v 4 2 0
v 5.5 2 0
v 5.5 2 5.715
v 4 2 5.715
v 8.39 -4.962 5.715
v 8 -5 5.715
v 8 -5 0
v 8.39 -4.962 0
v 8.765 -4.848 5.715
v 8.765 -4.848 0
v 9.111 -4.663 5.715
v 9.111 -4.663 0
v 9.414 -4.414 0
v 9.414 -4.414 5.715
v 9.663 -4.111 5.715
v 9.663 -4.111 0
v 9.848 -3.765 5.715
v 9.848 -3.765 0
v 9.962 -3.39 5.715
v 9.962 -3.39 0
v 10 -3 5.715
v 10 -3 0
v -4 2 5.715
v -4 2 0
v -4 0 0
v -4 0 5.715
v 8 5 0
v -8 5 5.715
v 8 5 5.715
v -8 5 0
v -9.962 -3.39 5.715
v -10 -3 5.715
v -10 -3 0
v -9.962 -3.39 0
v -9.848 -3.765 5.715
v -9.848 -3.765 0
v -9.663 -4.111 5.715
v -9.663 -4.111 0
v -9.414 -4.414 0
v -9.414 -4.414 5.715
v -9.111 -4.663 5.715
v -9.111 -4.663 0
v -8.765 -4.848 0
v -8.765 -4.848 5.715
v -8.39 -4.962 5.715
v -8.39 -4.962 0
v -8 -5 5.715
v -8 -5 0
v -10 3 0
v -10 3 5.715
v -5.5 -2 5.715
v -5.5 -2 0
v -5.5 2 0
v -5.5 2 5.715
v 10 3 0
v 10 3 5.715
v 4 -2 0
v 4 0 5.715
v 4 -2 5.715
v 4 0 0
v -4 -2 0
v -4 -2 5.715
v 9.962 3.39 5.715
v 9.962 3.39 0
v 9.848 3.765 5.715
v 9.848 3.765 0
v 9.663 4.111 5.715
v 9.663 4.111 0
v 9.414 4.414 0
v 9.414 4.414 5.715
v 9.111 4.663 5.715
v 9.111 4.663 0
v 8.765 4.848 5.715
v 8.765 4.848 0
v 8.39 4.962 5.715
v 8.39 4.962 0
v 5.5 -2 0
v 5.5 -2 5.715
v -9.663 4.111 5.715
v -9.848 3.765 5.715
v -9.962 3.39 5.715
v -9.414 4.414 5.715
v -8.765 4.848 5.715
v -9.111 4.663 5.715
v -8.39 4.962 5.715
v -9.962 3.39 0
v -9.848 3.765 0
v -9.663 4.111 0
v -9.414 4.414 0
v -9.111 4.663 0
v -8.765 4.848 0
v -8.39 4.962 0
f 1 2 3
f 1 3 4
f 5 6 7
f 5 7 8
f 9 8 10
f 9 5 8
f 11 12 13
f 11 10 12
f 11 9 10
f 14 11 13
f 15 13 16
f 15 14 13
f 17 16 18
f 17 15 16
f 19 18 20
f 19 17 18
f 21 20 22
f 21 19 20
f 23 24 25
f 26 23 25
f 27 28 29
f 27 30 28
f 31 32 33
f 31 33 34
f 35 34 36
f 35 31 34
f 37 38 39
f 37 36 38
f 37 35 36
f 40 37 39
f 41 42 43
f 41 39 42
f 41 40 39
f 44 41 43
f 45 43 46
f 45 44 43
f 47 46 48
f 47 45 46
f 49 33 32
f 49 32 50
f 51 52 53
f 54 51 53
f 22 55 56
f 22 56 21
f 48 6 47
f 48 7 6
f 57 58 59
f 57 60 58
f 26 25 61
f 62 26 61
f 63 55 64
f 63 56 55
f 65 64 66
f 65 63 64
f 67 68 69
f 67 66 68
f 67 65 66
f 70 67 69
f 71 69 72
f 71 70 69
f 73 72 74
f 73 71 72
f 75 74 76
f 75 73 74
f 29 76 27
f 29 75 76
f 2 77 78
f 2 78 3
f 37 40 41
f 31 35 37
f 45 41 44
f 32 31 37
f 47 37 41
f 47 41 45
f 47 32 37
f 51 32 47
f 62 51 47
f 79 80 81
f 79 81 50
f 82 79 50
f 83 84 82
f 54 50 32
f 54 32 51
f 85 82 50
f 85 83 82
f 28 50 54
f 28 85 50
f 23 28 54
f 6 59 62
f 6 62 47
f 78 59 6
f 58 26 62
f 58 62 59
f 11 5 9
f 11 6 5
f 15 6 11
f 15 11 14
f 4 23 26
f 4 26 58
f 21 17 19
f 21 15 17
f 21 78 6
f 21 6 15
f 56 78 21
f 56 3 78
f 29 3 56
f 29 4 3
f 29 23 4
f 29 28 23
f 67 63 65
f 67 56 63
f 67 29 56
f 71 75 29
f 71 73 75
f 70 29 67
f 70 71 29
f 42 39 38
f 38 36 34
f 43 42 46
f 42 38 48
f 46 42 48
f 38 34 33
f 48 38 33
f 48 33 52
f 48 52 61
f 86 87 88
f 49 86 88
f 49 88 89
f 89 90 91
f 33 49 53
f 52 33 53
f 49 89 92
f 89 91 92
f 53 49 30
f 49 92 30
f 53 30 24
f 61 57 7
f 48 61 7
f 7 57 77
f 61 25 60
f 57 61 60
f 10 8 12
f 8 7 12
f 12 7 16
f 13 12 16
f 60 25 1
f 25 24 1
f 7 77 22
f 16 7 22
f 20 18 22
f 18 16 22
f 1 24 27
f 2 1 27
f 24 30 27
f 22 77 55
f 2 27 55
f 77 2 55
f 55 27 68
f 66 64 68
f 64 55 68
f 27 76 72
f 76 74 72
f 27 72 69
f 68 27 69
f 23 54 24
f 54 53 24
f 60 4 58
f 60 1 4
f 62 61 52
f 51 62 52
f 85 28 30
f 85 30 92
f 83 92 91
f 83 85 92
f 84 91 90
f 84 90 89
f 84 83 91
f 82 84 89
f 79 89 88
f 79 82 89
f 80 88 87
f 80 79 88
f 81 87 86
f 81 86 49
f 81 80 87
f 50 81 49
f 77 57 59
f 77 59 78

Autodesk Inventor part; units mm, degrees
ref_plane "YZ Plane" through (0, 0, 0) normal (1, 0, 0) x (0, 1, 0)
ref_plane "XZ Plane" through (0, 0, 0) normal (0, 1, 0) x (-1, 0, 0)
ref_plane "XY Plane" through (0, 0, 0) normal (0, 0, 1) x (1, 0, 0)
sketch "Sketch1" plane through (0, 0, 0) normal (0, 0, 1) x (1, 0, 0)
  line L0 (-10, 5) -> (10, 5)
  line L1 (10, 5) -> (10, -5)
  line L2 (10, -5) -> (-10, -5)
  line L3 (-10, -5) -> (-10, 5)
  line L4 (-5.5, 2) -> (-4, 2)
  line L5 (-4, 2) -> (-4, -2)
  line L6 (-4, -2) -> (-5.5, -2)
  line L7 (-5.5, -2) -> (-5.5, 2)
  line L8 (5.5, 2) -> (4, 2)
  line L9 (4, 2) -> (4, -2)
  line L10 (4, -2) -> (5.5, -2)
  line L11 (5.5, -2) -> (5.5, 2)
  line L12 (-4, 0) -> (4, 0)
  point P0 (0, 0)
  point P1 (-10, 0)
  point P2 (0, 5)
  point P3 (0, 0)
  dimension "d0" = 20
  dimension "d2" = 10
  dimension "d3" = 8
  dimension "d4" = 1.5
  dimension "d5" = 4
extrude "Extrusion1" add sketch "Sketch1" along normal blind 5.715
fillet "Fillet1" radius 2 4 edges at (-10, 5, 2.8575) (10, 5, 2.8575) (10, -5, 2.8575) (-10, -5, 2.8575)
properties part number "RETAINER"
